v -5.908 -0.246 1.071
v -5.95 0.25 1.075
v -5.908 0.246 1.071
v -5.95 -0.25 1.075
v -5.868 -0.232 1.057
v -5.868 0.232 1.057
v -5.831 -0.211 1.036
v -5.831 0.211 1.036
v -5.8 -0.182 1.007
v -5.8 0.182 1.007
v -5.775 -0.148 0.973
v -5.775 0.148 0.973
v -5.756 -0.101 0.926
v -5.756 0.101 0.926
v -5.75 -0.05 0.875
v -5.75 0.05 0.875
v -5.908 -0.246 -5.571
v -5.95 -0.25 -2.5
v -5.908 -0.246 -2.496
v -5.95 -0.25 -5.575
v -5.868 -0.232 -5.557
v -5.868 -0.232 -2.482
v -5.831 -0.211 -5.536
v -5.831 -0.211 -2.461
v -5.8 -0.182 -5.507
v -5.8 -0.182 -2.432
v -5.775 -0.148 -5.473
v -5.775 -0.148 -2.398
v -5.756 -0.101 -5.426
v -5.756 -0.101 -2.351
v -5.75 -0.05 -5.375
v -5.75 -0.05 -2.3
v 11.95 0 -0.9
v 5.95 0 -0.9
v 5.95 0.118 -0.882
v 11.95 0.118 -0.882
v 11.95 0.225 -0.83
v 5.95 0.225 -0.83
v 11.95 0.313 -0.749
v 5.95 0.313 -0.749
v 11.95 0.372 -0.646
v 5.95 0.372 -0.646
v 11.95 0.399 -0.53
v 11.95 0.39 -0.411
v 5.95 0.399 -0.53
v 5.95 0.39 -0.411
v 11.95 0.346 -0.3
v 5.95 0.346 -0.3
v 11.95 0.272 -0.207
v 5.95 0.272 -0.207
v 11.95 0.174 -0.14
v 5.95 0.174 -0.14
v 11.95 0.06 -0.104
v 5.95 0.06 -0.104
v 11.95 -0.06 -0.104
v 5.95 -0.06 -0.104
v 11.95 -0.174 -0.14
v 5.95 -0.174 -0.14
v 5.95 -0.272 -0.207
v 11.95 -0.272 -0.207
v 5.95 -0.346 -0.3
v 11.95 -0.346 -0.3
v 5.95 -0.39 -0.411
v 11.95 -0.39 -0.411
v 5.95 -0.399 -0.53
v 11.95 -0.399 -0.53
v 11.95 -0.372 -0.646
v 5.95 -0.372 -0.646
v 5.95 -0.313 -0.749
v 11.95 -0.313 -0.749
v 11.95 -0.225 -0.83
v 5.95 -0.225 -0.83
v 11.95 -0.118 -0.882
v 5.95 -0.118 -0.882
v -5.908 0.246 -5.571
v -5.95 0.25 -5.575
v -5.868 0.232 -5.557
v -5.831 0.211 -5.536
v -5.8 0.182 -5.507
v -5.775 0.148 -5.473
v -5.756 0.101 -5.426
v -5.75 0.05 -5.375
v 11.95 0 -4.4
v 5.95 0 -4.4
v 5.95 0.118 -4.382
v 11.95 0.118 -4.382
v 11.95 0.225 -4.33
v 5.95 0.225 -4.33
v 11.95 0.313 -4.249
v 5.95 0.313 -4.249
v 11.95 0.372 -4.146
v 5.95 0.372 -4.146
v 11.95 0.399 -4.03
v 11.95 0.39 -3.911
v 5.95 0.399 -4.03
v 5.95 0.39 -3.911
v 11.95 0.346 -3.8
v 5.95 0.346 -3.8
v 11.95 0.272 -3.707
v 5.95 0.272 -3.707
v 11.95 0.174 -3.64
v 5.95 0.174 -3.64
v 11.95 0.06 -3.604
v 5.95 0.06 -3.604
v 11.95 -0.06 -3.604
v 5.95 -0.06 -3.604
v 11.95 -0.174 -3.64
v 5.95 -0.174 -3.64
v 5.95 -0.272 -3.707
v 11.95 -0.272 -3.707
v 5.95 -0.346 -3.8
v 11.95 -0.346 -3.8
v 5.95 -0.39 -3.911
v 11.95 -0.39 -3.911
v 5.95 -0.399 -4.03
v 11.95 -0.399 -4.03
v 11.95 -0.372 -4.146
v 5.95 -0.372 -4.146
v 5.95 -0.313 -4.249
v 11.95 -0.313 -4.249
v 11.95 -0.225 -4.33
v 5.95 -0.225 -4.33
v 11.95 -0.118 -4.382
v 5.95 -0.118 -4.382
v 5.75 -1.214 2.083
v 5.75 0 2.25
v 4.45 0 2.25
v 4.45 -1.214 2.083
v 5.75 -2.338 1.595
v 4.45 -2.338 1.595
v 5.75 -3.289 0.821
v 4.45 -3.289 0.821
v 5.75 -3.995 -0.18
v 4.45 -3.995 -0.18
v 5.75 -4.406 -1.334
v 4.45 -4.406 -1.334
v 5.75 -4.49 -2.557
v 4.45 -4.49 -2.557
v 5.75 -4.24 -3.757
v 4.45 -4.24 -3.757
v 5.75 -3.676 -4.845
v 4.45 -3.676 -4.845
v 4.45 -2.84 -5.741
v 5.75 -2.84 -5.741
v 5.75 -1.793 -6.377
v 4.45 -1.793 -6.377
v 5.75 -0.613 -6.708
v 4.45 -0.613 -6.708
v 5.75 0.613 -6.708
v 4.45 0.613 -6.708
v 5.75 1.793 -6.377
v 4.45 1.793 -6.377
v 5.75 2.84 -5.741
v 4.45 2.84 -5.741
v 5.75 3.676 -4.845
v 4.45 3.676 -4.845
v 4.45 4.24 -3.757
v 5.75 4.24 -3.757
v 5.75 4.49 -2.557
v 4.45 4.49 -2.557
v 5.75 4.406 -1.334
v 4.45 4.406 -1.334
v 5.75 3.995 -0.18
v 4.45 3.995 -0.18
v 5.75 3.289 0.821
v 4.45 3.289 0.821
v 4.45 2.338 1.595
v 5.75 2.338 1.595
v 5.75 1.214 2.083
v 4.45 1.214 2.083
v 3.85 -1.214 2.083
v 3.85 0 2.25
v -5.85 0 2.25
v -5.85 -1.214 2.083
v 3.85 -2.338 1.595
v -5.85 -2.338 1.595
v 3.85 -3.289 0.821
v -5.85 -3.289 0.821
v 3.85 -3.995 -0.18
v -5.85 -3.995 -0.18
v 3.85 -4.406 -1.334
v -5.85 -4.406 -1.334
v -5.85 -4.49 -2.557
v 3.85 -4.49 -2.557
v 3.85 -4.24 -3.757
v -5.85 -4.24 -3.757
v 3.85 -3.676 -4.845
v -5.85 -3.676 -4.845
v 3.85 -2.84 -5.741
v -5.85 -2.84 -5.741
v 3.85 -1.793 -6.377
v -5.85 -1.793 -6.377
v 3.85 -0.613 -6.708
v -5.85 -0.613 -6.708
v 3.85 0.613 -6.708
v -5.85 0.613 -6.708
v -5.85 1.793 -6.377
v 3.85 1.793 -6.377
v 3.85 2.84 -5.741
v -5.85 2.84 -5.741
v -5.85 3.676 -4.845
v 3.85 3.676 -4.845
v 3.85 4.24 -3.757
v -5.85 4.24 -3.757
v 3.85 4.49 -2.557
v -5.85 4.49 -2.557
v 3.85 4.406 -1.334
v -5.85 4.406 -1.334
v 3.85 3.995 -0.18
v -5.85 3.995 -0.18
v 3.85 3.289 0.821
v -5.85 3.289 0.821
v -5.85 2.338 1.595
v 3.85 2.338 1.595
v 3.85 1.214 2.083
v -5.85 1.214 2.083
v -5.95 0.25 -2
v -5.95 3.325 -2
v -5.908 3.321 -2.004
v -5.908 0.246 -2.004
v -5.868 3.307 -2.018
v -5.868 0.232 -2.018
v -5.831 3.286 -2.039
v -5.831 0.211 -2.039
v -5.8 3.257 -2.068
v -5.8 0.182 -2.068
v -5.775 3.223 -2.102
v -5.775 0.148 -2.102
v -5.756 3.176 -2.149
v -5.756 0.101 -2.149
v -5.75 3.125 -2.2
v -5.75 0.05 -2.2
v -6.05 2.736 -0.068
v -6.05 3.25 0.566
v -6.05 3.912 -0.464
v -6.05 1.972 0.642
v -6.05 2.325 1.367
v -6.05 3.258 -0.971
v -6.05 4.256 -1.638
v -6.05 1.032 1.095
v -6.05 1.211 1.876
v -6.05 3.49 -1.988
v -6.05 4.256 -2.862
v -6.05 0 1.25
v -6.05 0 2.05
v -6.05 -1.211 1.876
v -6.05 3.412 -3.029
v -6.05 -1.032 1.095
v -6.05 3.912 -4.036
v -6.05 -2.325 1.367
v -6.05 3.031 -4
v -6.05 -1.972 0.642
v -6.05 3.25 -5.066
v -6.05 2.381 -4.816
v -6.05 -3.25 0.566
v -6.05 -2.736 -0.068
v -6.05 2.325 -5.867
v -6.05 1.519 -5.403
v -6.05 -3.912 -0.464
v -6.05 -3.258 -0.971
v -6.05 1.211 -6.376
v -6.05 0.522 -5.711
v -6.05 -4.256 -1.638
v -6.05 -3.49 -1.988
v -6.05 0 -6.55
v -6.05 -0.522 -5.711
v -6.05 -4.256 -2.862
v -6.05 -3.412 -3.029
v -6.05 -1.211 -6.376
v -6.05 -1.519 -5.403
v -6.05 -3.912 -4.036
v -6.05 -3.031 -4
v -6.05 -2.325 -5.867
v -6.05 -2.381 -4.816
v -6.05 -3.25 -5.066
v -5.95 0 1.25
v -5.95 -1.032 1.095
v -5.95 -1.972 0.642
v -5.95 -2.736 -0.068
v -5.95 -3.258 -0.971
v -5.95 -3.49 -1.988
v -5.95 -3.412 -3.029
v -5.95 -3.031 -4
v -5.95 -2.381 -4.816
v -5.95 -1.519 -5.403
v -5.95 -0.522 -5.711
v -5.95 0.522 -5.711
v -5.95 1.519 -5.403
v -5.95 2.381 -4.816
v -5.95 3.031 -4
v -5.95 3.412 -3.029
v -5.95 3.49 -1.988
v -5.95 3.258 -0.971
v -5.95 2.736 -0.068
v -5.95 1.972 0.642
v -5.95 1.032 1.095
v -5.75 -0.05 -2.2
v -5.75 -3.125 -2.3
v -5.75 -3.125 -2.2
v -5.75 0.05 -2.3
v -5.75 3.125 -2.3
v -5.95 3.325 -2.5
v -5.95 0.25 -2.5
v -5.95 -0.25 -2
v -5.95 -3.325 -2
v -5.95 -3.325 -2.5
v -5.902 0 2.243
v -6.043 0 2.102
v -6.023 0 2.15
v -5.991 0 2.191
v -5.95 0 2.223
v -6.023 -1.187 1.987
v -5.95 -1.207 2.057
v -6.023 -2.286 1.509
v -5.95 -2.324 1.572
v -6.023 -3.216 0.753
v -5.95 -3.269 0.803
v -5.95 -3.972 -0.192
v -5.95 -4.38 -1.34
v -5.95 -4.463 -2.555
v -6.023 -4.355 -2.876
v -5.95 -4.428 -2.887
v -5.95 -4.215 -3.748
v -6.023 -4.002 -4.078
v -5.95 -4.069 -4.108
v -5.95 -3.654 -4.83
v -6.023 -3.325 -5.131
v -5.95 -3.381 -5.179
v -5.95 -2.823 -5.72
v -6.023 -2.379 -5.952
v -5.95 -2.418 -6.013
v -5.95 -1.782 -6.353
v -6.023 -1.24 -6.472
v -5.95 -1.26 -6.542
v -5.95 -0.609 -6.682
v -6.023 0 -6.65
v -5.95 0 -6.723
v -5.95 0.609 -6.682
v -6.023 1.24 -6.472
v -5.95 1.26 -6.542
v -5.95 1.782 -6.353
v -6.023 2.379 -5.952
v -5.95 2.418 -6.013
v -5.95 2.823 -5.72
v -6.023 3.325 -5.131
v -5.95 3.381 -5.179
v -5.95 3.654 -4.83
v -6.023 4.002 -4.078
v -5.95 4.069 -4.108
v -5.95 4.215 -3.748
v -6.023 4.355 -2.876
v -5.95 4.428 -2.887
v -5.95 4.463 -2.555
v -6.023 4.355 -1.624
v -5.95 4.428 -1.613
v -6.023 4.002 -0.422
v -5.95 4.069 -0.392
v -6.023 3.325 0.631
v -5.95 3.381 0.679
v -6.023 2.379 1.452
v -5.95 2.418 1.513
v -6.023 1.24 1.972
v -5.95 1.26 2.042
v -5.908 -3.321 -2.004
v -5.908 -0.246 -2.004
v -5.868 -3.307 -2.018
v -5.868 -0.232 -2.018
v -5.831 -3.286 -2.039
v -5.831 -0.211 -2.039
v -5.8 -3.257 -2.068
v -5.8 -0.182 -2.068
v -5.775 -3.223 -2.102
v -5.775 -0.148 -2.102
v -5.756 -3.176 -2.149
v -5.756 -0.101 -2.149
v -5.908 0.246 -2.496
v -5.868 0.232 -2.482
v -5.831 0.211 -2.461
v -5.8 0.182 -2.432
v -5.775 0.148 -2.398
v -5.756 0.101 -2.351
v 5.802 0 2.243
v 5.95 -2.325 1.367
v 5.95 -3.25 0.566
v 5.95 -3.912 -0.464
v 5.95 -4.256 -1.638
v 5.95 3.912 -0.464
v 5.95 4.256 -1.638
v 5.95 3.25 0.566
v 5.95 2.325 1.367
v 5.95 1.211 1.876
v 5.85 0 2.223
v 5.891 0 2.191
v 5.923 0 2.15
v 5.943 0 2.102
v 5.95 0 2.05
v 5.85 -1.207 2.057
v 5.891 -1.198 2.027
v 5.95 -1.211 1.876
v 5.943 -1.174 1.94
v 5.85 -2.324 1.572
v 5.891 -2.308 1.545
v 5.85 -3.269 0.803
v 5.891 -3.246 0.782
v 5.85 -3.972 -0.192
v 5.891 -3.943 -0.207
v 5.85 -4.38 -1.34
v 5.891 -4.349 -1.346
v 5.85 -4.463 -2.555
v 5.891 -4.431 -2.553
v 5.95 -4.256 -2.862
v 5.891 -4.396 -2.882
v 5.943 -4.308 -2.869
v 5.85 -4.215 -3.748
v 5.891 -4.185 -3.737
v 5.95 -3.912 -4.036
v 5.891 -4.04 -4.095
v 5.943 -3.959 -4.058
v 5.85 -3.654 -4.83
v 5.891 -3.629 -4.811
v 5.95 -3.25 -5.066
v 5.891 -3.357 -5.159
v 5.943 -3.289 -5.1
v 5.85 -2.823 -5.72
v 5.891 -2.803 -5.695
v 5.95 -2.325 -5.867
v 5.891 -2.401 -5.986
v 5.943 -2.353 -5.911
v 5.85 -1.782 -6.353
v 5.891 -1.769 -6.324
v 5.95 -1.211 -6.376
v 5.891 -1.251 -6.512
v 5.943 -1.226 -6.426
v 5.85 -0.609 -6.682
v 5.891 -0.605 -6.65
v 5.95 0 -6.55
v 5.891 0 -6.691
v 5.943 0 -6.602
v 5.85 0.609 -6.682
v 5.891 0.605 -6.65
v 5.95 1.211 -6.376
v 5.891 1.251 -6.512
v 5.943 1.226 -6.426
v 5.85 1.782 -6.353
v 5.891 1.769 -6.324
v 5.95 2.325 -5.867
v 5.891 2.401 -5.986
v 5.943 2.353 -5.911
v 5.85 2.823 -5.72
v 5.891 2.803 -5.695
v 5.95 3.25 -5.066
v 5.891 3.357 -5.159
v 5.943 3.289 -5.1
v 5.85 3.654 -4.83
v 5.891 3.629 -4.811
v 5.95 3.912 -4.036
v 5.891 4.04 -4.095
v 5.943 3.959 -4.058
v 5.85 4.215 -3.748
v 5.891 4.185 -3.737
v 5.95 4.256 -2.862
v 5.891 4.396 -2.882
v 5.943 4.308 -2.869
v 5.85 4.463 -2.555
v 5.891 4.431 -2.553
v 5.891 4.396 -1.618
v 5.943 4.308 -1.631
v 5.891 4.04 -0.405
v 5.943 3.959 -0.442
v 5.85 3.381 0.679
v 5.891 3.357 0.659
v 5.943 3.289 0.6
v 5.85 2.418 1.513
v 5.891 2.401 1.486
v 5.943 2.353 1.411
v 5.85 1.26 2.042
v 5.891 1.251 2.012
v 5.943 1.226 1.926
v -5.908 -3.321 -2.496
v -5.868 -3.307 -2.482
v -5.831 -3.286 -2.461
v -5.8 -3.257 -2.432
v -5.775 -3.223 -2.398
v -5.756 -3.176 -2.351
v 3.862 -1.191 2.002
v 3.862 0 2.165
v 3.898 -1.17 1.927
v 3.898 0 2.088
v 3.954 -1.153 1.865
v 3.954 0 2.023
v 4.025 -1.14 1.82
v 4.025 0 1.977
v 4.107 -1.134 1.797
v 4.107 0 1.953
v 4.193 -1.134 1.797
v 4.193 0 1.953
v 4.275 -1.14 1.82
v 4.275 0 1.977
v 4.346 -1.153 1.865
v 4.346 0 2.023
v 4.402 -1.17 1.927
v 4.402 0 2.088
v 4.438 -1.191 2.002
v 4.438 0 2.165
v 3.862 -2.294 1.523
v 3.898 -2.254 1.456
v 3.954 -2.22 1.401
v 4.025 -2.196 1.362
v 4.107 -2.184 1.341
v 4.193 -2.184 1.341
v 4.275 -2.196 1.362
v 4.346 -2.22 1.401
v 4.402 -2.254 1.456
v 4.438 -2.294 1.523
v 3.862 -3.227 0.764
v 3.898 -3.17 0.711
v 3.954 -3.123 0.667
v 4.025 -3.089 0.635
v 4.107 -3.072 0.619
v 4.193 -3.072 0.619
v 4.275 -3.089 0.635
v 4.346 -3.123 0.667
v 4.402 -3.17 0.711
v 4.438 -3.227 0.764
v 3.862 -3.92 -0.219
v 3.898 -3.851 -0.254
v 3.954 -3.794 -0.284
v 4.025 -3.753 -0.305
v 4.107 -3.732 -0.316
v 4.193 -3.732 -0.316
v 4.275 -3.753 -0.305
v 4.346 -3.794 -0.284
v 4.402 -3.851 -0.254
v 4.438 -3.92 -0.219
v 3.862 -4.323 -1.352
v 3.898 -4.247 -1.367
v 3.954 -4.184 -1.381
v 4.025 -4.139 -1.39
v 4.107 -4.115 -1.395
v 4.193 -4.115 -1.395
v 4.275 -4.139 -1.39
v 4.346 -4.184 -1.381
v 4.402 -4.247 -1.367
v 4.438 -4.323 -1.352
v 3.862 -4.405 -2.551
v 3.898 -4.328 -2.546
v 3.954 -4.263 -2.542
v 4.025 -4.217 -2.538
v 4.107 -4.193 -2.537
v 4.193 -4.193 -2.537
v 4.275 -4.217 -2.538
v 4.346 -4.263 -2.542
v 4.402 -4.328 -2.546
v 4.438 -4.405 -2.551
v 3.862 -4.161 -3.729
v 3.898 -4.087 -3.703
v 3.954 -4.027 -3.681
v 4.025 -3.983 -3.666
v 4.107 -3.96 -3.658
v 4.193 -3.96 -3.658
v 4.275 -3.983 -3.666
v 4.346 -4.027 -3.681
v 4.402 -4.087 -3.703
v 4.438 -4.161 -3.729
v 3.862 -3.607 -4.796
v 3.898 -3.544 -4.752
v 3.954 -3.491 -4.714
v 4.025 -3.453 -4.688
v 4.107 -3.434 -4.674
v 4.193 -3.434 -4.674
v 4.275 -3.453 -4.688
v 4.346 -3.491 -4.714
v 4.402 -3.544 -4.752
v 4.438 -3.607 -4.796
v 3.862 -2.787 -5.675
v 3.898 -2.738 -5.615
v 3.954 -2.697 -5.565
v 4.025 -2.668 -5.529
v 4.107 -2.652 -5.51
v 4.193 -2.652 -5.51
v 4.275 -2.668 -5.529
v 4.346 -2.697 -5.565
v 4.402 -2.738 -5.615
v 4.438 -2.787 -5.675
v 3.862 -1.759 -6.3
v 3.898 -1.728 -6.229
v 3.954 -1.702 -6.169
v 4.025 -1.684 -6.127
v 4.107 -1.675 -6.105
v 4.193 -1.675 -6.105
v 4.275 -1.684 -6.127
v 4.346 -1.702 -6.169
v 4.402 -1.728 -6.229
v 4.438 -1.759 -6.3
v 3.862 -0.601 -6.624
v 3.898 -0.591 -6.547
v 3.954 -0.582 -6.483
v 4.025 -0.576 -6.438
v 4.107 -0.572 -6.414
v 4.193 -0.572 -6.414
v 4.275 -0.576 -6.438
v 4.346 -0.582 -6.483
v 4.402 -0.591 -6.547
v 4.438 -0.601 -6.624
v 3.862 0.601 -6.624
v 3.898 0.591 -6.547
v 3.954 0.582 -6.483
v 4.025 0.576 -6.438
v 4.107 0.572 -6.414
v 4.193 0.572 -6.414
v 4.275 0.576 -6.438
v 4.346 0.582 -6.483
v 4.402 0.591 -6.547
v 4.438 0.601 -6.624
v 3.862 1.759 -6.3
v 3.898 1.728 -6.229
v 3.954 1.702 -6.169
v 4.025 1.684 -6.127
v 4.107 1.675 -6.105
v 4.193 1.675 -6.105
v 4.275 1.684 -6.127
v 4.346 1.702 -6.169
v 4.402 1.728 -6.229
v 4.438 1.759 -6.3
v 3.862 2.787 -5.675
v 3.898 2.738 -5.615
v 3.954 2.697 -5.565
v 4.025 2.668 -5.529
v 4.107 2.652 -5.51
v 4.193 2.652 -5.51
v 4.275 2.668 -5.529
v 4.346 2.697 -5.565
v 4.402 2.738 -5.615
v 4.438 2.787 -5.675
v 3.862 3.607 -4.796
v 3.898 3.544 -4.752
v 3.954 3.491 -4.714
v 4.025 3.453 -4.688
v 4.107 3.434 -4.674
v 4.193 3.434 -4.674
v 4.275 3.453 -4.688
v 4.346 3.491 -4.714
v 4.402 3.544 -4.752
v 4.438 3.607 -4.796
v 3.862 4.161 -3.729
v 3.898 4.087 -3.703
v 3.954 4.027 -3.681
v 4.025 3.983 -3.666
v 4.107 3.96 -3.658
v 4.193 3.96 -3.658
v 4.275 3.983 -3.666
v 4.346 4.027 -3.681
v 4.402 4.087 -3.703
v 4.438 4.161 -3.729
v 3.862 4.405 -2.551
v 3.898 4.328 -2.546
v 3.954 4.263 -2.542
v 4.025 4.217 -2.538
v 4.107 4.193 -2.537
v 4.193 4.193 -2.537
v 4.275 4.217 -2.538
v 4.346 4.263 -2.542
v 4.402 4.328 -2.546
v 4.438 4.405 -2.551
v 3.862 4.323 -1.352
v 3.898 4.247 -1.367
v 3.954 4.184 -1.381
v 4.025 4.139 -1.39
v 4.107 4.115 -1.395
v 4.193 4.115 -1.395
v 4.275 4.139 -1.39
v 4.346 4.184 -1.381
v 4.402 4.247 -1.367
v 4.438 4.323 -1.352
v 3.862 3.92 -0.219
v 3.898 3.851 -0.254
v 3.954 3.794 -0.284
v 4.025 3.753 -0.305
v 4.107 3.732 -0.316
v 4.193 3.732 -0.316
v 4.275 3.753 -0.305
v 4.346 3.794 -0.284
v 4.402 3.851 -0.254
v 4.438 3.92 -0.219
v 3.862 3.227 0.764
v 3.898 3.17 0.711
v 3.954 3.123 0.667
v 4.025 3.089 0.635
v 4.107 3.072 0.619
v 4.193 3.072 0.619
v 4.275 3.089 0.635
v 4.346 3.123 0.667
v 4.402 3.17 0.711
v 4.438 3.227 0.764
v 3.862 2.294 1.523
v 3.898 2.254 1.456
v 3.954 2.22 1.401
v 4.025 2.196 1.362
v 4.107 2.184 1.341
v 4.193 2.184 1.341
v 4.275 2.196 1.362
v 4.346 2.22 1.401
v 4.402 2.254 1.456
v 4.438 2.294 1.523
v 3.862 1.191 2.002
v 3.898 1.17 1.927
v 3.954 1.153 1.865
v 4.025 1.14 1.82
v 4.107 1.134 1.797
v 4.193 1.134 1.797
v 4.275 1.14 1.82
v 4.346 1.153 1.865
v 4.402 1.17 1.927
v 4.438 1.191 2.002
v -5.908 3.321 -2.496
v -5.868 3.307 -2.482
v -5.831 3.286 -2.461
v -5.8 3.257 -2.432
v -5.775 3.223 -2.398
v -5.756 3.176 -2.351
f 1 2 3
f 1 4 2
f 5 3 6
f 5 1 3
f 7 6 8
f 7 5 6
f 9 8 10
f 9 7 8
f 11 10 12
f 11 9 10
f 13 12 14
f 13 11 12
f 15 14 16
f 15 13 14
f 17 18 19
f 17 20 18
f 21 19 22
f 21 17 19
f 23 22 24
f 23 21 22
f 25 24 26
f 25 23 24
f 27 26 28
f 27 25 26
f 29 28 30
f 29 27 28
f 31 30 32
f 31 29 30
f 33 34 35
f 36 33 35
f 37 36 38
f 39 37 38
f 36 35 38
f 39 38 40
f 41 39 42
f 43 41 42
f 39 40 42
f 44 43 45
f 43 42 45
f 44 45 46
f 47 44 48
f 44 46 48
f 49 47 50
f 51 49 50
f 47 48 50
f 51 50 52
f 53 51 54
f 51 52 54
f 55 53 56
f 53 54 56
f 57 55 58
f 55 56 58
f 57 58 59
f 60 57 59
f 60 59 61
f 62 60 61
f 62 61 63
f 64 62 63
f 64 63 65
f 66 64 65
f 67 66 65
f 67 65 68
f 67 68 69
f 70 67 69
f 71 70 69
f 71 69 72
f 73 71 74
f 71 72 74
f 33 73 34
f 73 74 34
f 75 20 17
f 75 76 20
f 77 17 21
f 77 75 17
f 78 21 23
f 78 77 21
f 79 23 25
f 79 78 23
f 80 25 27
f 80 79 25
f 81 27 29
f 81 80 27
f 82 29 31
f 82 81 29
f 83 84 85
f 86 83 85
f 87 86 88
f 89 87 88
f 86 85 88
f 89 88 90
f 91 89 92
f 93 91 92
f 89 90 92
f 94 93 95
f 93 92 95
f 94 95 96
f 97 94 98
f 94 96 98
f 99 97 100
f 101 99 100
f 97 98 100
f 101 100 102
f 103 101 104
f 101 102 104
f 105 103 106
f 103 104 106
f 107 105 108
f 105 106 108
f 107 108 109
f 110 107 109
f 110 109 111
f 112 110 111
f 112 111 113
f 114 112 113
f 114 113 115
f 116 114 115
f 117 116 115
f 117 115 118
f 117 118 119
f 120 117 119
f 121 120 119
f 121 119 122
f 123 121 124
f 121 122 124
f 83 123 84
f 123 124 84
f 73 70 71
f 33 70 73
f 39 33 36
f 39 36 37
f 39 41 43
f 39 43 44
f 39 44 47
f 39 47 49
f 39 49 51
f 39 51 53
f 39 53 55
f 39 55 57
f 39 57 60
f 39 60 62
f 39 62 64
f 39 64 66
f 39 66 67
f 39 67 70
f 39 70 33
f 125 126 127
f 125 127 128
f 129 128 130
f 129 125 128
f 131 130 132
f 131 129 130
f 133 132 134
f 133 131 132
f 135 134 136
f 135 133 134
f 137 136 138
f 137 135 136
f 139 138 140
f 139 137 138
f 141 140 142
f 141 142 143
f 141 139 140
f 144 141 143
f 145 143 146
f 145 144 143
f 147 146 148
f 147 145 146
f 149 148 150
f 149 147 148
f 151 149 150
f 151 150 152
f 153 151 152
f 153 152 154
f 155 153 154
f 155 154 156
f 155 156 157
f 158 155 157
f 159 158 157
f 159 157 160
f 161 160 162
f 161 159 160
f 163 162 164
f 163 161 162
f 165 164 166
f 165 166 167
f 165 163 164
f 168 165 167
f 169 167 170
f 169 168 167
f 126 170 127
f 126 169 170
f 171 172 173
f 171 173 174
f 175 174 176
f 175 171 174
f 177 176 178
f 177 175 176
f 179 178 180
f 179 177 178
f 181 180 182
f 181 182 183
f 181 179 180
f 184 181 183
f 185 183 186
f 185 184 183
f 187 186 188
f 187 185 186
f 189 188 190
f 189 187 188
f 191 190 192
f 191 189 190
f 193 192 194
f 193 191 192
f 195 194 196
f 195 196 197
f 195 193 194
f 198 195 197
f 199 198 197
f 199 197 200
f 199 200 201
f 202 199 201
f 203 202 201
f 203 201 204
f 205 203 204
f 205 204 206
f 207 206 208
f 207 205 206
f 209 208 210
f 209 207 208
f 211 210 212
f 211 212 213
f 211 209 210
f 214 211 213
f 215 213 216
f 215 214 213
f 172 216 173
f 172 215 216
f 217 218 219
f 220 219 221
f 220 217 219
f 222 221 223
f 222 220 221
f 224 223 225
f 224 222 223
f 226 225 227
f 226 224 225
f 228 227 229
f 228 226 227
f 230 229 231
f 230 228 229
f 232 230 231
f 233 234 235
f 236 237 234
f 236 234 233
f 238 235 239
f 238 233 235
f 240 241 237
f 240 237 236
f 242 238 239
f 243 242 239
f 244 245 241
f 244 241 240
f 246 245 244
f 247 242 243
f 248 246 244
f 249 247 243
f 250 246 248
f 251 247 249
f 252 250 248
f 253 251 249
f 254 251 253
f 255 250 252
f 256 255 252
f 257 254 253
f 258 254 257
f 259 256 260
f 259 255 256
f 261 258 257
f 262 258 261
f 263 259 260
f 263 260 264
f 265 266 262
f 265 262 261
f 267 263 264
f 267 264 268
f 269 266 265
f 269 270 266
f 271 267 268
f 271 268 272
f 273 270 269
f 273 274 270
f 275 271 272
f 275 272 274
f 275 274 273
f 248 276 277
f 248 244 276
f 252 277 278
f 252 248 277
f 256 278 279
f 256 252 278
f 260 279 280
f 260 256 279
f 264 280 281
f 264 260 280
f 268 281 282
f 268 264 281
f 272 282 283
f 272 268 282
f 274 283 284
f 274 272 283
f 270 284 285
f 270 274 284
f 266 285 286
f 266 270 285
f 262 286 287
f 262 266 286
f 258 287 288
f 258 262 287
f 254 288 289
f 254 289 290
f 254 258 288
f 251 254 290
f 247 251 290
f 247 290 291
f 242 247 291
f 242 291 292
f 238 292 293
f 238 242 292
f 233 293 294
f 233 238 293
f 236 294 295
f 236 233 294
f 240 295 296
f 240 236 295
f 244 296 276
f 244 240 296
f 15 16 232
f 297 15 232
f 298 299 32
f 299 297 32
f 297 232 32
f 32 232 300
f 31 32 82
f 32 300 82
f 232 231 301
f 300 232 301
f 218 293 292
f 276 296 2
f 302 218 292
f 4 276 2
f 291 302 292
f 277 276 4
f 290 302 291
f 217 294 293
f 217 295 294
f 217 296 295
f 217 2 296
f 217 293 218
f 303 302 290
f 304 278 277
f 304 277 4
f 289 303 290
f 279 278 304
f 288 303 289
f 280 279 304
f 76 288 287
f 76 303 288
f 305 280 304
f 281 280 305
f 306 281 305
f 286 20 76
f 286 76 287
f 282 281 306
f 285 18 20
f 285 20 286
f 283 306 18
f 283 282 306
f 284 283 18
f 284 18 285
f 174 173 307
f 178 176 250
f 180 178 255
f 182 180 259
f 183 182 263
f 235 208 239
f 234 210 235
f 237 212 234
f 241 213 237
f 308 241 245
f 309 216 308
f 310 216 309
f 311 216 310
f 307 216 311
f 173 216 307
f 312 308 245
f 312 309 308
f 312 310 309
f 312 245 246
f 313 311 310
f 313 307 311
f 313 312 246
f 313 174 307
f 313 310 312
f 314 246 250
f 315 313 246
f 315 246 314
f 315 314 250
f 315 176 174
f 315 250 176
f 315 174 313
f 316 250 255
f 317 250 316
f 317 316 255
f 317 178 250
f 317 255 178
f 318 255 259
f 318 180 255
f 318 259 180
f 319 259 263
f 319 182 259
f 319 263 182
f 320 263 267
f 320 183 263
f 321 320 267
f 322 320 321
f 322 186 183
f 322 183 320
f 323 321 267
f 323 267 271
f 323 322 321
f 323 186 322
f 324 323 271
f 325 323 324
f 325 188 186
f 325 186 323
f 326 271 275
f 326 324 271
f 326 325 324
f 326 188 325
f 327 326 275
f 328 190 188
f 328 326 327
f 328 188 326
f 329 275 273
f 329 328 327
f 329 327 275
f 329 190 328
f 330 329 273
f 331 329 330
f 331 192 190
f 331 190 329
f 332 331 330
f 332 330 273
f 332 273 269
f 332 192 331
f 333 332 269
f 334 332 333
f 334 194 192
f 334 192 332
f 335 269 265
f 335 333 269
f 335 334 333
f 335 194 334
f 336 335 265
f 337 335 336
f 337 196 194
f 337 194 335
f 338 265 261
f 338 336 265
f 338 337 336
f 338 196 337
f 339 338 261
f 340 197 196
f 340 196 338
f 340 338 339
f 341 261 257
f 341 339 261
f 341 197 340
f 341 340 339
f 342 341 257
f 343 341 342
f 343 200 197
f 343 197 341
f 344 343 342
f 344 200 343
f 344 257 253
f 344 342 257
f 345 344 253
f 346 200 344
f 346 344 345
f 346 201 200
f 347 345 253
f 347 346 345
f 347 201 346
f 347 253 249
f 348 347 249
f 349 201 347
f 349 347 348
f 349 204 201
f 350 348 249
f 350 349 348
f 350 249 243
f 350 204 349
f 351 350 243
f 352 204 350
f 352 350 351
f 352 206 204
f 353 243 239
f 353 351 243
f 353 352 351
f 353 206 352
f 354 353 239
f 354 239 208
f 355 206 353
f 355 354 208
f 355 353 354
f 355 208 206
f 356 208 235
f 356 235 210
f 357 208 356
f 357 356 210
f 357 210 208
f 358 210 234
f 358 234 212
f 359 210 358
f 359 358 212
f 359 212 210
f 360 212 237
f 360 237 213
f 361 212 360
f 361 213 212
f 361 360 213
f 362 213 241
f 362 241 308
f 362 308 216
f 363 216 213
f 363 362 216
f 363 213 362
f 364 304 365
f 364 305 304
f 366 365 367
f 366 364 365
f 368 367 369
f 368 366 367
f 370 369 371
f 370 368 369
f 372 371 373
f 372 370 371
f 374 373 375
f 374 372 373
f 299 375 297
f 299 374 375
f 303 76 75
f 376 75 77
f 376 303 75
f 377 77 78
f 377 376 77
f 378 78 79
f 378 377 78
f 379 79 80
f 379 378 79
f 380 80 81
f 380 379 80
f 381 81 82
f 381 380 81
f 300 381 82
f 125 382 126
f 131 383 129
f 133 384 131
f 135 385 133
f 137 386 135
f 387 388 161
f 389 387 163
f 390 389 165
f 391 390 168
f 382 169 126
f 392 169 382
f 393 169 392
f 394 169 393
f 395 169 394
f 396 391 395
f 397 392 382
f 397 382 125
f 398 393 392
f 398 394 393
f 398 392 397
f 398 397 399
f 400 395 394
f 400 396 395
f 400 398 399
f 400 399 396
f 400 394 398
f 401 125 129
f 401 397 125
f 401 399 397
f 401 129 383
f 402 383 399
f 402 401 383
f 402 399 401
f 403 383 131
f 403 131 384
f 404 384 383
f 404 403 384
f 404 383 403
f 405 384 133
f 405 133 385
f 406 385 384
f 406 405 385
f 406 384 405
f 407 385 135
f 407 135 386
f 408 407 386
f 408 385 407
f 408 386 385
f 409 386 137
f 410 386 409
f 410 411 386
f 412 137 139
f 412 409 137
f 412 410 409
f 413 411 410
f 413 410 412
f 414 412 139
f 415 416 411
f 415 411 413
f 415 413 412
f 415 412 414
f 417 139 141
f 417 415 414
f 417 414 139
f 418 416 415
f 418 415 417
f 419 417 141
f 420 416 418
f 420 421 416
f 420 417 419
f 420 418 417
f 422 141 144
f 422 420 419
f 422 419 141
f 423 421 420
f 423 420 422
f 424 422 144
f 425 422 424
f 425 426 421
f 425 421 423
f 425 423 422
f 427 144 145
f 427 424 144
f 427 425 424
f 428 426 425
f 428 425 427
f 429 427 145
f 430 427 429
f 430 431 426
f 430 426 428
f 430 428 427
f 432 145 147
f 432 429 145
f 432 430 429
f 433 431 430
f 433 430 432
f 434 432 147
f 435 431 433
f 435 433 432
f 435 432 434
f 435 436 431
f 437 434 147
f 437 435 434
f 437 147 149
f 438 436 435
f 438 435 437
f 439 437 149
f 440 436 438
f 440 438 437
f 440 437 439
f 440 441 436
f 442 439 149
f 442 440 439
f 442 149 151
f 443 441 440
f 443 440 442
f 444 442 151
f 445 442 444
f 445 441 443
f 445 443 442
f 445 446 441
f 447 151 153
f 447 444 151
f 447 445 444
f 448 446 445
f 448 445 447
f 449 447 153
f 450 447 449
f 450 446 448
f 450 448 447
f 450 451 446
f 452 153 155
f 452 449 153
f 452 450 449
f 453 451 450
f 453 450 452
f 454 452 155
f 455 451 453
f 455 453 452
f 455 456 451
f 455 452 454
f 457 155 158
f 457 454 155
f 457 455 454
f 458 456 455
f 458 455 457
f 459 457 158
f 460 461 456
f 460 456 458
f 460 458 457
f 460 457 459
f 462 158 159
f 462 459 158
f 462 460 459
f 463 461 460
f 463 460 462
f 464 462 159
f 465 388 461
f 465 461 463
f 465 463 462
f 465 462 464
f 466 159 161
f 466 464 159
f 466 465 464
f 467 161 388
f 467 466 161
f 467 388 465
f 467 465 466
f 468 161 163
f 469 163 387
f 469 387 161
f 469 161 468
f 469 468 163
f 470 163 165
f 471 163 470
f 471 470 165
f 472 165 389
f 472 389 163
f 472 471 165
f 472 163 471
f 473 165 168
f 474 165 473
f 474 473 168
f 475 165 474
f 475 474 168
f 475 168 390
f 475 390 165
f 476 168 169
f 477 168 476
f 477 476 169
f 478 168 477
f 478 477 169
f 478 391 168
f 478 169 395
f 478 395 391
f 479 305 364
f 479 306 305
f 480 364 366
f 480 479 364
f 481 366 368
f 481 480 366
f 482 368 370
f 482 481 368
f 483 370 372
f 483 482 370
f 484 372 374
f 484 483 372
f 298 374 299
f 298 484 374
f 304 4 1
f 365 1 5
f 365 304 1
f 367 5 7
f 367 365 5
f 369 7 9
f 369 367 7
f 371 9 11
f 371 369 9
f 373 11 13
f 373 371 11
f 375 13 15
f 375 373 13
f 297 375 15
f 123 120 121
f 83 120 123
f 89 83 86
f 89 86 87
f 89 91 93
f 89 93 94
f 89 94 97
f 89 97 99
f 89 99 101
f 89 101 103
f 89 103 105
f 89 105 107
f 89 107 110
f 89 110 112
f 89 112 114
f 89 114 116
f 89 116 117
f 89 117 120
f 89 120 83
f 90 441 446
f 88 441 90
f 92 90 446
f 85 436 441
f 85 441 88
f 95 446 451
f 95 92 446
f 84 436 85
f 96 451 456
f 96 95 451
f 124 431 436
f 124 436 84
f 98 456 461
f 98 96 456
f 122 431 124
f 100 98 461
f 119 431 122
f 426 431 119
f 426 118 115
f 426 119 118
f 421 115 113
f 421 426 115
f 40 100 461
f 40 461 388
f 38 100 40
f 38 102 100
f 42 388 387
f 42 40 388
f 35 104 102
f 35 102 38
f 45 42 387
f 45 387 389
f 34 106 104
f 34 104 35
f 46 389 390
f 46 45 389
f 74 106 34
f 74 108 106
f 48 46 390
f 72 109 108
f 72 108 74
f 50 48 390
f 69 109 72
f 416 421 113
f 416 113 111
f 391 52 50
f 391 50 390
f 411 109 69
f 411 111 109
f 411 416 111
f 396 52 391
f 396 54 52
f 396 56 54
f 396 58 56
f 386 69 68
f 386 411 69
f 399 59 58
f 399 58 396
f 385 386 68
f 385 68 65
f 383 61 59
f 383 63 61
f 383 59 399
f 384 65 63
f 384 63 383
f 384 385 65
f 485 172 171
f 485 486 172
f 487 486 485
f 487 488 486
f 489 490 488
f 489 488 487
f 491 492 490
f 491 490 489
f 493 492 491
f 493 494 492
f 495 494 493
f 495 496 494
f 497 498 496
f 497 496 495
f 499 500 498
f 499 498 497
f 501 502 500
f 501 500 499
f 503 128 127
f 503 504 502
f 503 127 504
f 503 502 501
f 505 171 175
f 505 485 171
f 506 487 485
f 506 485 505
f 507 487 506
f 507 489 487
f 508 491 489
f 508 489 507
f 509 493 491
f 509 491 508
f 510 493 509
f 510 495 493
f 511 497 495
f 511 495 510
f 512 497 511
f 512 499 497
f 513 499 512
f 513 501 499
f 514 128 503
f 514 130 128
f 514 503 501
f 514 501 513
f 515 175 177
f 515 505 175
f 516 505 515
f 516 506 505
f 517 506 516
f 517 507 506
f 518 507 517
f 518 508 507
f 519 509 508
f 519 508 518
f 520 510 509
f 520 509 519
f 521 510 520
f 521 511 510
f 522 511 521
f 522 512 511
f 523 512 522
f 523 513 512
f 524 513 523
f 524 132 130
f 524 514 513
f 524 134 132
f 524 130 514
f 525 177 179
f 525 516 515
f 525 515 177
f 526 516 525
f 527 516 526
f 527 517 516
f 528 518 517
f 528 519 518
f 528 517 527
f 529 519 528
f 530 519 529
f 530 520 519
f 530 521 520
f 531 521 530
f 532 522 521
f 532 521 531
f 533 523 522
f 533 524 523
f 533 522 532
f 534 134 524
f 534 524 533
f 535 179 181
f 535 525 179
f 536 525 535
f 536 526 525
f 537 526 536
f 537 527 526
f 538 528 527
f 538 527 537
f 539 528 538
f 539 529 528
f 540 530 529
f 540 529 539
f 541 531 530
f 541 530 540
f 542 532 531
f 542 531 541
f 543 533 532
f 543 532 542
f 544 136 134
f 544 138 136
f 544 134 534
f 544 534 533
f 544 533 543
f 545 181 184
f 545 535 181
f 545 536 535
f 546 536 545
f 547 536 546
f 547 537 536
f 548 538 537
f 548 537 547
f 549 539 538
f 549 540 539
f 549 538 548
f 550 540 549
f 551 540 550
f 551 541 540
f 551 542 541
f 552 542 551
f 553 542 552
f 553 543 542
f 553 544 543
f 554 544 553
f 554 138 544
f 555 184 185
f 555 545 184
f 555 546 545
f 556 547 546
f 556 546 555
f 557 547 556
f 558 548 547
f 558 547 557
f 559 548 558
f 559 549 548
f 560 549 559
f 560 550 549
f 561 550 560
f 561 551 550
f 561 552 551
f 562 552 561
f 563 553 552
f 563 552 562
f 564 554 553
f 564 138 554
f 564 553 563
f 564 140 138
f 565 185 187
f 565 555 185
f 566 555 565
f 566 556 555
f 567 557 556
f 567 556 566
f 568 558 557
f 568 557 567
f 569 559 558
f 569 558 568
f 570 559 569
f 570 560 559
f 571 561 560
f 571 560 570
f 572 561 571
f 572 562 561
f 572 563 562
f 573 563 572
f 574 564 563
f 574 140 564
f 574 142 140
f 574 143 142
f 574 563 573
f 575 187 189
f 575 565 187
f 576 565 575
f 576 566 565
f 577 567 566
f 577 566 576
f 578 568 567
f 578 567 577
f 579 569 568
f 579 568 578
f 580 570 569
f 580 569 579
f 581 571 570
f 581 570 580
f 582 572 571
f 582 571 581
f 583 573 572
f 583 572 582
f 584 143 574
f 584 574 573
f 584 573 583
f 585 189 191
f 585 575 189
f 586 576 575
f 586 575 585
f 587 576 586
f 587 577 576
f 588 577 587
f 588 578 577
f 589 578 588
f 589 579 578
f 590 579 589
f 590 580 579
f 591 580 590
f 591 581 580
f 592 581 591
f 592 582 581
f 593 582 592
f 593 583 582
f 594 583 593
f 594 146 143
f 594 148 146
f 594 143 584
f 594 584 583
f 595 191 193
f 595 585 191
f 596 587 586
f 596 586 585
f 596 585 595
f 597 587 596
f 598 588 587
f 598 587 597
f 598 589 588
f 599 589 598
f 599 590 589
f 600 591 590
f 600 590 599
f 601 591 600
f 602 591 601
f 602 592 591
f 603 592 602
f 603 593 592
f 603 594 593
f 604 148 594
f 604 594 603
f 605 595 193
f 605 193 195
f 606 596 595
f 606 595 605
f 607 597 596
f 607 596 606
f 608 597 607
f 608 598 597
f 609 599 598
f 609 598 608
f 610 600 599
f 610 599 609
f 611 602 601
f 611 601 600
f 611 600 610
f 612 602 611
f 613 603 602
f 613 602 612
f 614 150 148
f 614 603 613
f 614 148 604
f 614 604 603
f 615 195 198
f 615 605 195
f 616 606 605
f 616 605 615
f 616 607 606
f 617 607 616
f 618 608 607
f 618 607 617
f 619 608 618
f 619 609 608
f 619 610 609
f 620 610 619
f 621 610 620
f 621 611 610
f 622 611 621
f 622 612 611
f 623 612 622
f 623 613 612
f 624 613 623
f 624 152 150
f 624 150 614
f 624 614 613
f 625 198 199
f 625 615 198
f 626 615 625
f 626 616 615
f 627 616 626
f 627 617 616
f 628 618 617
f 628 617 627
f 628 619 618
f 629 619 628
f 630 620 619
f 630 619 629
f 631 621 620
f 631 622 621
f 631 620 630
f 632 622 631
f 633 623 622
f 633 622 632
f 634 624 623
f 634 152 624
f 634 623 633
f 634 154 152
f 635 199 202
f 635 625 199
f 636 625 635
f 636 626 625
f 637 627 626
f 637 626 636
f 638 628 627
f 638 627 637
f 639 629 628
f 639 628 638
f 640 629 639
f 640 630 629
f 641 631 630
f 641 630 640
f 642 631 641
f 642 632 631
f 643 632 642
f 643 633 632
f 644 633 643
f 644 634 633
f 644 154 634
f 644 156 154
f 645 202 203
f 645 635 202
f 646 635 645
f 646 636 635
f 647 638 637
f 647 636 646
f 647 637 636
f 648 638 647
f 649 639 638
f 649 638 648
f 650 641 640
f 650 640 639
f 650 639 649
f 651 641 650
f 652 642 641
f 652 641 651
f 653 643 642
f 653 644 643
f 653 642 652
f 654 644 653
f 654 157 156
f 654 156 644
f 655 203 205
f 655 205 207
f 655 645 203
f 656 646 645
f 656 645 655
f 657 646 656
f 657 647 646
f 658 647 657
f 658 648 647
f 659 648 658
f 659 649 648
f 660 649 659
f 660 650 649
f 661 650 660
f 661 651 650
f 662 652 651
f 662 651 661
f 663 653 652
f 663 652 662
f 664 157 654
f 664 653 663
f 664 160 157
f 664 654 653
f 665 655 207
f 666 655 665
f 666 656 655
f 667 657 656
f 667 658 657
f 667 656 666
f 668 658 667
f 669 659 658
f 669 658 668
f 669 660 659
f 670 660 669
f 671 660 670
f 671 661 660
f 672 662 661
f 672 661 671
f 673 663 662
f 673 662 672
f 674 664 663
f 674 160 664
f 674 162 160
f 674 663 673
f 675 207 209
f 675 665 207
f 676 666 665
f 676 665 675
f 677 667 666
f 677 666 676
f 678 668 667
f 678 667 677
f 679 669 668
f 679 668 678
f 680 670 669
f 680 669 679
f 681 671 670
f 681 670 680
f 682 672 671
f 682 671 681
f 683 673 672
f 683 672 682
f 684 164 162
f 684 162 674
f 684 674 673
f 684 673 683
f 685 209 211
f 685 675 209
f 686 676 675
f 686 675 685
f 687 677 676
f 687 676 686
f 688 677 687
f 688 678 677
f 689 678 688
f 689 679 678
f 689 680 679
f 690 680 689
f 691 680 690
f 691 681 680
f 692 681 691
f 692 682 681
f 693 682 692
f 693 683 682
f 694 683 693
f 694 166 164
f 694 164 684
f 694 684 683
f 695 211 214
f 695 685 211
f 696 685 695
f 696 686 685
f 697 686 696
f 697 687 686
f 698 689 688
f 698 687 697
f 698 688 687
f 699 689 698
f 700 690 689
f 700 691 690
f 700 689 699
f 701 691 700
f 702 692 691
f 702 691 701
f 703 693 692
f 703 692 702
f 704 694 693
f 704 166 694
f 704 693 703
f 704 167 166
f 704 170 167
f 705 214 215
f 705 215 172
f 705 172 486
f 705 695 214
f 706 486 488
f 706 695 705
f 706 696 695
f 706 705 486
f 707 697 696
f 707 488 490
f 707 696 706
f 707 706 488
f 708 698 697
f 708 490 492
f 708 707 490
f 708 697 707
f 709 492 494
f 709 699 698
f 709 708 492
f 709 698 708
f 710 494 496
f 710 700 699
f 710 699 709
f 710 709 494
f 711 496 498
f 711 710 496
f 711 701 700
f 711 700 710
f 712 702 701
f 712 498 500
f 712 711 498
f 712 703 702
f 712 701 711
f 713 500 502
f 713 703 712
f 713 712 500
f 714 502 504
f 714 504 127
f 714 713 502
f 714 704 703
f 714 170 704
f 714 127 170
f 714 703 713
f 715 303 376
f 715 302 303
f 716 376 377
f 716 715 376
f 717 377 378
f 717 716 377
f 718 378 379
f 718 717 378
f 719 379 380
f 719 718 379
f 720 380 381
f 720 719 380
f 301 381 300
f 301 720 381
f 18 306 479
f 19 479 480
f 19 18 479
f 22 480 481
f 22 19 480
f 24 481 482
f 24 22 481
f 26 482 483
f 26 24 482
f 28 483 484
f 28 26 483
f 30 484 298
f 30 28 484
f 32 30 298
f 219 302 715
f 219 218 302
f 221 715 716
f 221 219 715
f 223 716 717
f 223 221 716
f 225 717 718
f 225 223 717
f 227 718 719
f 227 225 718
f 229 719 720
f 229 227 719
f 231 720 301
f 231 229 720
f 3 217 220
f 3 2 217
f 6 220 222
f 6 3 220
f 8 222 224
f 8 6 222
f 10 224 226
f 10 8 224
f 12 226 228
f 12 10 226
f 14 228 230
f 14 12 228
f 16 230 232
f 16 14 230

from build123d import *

# Parameters (mm, degrees)
SKETCH6_R           = 0.4
BOSS_EXTRUDE1_DEPTH = 6
CUT_EXTRUDE1_DEPTH  = 0.2
FILLET2_R           = 0.2


with BuildPart() as part:
    # Sketch1 → Revolve1 (revolve)
    with BuildSketch(Plane(origin=(0, 0, 0), x_dir=(1, 0, 0), z_dir=(0, 1, 0))):
        with BuildLine():
            Line((-5.95, -1.25), (-6.05, -1.25))
            Line((-6.05, -1.25), (-6.05, -2.25))
            Line((-6.05, -2.25), (-5.95, -2.25))
            Line((-5.95, -2.25), (3.85, -2.25))
            ThreePointArc((3.85, -2.25), (4.15, -1.95), (4.45, -2.25))
            Line((4.45, -2.25), (5.95, -2.25))
            Line((5.95, -2.25), (5.95, 2.25))
            Line((5.95, 2.25), (-5.95, 2.25))
            Line((-5.95, 2.25), (-5.95, -1.25))
        make_face()
    revolve(axis=Axis((-5.95, 0, -2.25), (1, 0, 0)))

    # Sketch6 → Boss-Extrude1 (add)
    with BuildSketch(Plane(origin=(5.95, 0, 0), x_dir=(0, 0, -1), z_dir=(1, 0, 0))):
        with Locations((0.5, 0)):
            Circle(SKETCH6_R)
        with Locations((4, 0)):
            Circle(SKETCH6_R)
    extrude(amount=BOSS_EXTRUDE1_DEPTH)

    # Sketch8 → Cut-Extrude1 (cut)
    with BuildSketch(Plane.ZY.offset(5.95)):
        Polygon((-2, -0.25), (-2, -3.325), (-2.5, -3.325), (-2.5, -0.25), (-5.575, -0.25), (-5.575, 0.25), (-2.5, 0.25), (-2.5, 3.325), (-2, 3.325), (-2, 0.25), (1.075, 0.25), (1.075, -0.25), align=None)
    extrude(amount=-CUT_EXTRUDE1_DEPTH, mode=Mode.SUBTRACT)

    # Fillet2
    fillet2_edges = [part.edges().sort_by_distance(p)[0] for p in [
        (-5.75, -3.325, -2.25),
        (-5.75, -1.7875, -2.5),
        (-5.75, -0.25, -4.0375),
        (-5.75, 0, -5.575),
        (-5.75, 0.25, -4.0375),
        (-5.75, 1.7875, -2.5),
        (-5.75, 3.325, -2.25),
        (-5.75, 1.7875, -2),
        (-5.75, 0.25, -0.4625),
        (-5.75, 0, 1.075),
        (-5.75, -0.25, -0.4625),
        (-5.75, -1.7875, -2),
        (5.95, 0, -6.75),
        (-6.05, 0, -6.75),
    ]]
    fillet(fillet2_edges, radius=FILLET2_R - 0.0001)  # a hair under: the kernel refuses the full size


solid = part.part
